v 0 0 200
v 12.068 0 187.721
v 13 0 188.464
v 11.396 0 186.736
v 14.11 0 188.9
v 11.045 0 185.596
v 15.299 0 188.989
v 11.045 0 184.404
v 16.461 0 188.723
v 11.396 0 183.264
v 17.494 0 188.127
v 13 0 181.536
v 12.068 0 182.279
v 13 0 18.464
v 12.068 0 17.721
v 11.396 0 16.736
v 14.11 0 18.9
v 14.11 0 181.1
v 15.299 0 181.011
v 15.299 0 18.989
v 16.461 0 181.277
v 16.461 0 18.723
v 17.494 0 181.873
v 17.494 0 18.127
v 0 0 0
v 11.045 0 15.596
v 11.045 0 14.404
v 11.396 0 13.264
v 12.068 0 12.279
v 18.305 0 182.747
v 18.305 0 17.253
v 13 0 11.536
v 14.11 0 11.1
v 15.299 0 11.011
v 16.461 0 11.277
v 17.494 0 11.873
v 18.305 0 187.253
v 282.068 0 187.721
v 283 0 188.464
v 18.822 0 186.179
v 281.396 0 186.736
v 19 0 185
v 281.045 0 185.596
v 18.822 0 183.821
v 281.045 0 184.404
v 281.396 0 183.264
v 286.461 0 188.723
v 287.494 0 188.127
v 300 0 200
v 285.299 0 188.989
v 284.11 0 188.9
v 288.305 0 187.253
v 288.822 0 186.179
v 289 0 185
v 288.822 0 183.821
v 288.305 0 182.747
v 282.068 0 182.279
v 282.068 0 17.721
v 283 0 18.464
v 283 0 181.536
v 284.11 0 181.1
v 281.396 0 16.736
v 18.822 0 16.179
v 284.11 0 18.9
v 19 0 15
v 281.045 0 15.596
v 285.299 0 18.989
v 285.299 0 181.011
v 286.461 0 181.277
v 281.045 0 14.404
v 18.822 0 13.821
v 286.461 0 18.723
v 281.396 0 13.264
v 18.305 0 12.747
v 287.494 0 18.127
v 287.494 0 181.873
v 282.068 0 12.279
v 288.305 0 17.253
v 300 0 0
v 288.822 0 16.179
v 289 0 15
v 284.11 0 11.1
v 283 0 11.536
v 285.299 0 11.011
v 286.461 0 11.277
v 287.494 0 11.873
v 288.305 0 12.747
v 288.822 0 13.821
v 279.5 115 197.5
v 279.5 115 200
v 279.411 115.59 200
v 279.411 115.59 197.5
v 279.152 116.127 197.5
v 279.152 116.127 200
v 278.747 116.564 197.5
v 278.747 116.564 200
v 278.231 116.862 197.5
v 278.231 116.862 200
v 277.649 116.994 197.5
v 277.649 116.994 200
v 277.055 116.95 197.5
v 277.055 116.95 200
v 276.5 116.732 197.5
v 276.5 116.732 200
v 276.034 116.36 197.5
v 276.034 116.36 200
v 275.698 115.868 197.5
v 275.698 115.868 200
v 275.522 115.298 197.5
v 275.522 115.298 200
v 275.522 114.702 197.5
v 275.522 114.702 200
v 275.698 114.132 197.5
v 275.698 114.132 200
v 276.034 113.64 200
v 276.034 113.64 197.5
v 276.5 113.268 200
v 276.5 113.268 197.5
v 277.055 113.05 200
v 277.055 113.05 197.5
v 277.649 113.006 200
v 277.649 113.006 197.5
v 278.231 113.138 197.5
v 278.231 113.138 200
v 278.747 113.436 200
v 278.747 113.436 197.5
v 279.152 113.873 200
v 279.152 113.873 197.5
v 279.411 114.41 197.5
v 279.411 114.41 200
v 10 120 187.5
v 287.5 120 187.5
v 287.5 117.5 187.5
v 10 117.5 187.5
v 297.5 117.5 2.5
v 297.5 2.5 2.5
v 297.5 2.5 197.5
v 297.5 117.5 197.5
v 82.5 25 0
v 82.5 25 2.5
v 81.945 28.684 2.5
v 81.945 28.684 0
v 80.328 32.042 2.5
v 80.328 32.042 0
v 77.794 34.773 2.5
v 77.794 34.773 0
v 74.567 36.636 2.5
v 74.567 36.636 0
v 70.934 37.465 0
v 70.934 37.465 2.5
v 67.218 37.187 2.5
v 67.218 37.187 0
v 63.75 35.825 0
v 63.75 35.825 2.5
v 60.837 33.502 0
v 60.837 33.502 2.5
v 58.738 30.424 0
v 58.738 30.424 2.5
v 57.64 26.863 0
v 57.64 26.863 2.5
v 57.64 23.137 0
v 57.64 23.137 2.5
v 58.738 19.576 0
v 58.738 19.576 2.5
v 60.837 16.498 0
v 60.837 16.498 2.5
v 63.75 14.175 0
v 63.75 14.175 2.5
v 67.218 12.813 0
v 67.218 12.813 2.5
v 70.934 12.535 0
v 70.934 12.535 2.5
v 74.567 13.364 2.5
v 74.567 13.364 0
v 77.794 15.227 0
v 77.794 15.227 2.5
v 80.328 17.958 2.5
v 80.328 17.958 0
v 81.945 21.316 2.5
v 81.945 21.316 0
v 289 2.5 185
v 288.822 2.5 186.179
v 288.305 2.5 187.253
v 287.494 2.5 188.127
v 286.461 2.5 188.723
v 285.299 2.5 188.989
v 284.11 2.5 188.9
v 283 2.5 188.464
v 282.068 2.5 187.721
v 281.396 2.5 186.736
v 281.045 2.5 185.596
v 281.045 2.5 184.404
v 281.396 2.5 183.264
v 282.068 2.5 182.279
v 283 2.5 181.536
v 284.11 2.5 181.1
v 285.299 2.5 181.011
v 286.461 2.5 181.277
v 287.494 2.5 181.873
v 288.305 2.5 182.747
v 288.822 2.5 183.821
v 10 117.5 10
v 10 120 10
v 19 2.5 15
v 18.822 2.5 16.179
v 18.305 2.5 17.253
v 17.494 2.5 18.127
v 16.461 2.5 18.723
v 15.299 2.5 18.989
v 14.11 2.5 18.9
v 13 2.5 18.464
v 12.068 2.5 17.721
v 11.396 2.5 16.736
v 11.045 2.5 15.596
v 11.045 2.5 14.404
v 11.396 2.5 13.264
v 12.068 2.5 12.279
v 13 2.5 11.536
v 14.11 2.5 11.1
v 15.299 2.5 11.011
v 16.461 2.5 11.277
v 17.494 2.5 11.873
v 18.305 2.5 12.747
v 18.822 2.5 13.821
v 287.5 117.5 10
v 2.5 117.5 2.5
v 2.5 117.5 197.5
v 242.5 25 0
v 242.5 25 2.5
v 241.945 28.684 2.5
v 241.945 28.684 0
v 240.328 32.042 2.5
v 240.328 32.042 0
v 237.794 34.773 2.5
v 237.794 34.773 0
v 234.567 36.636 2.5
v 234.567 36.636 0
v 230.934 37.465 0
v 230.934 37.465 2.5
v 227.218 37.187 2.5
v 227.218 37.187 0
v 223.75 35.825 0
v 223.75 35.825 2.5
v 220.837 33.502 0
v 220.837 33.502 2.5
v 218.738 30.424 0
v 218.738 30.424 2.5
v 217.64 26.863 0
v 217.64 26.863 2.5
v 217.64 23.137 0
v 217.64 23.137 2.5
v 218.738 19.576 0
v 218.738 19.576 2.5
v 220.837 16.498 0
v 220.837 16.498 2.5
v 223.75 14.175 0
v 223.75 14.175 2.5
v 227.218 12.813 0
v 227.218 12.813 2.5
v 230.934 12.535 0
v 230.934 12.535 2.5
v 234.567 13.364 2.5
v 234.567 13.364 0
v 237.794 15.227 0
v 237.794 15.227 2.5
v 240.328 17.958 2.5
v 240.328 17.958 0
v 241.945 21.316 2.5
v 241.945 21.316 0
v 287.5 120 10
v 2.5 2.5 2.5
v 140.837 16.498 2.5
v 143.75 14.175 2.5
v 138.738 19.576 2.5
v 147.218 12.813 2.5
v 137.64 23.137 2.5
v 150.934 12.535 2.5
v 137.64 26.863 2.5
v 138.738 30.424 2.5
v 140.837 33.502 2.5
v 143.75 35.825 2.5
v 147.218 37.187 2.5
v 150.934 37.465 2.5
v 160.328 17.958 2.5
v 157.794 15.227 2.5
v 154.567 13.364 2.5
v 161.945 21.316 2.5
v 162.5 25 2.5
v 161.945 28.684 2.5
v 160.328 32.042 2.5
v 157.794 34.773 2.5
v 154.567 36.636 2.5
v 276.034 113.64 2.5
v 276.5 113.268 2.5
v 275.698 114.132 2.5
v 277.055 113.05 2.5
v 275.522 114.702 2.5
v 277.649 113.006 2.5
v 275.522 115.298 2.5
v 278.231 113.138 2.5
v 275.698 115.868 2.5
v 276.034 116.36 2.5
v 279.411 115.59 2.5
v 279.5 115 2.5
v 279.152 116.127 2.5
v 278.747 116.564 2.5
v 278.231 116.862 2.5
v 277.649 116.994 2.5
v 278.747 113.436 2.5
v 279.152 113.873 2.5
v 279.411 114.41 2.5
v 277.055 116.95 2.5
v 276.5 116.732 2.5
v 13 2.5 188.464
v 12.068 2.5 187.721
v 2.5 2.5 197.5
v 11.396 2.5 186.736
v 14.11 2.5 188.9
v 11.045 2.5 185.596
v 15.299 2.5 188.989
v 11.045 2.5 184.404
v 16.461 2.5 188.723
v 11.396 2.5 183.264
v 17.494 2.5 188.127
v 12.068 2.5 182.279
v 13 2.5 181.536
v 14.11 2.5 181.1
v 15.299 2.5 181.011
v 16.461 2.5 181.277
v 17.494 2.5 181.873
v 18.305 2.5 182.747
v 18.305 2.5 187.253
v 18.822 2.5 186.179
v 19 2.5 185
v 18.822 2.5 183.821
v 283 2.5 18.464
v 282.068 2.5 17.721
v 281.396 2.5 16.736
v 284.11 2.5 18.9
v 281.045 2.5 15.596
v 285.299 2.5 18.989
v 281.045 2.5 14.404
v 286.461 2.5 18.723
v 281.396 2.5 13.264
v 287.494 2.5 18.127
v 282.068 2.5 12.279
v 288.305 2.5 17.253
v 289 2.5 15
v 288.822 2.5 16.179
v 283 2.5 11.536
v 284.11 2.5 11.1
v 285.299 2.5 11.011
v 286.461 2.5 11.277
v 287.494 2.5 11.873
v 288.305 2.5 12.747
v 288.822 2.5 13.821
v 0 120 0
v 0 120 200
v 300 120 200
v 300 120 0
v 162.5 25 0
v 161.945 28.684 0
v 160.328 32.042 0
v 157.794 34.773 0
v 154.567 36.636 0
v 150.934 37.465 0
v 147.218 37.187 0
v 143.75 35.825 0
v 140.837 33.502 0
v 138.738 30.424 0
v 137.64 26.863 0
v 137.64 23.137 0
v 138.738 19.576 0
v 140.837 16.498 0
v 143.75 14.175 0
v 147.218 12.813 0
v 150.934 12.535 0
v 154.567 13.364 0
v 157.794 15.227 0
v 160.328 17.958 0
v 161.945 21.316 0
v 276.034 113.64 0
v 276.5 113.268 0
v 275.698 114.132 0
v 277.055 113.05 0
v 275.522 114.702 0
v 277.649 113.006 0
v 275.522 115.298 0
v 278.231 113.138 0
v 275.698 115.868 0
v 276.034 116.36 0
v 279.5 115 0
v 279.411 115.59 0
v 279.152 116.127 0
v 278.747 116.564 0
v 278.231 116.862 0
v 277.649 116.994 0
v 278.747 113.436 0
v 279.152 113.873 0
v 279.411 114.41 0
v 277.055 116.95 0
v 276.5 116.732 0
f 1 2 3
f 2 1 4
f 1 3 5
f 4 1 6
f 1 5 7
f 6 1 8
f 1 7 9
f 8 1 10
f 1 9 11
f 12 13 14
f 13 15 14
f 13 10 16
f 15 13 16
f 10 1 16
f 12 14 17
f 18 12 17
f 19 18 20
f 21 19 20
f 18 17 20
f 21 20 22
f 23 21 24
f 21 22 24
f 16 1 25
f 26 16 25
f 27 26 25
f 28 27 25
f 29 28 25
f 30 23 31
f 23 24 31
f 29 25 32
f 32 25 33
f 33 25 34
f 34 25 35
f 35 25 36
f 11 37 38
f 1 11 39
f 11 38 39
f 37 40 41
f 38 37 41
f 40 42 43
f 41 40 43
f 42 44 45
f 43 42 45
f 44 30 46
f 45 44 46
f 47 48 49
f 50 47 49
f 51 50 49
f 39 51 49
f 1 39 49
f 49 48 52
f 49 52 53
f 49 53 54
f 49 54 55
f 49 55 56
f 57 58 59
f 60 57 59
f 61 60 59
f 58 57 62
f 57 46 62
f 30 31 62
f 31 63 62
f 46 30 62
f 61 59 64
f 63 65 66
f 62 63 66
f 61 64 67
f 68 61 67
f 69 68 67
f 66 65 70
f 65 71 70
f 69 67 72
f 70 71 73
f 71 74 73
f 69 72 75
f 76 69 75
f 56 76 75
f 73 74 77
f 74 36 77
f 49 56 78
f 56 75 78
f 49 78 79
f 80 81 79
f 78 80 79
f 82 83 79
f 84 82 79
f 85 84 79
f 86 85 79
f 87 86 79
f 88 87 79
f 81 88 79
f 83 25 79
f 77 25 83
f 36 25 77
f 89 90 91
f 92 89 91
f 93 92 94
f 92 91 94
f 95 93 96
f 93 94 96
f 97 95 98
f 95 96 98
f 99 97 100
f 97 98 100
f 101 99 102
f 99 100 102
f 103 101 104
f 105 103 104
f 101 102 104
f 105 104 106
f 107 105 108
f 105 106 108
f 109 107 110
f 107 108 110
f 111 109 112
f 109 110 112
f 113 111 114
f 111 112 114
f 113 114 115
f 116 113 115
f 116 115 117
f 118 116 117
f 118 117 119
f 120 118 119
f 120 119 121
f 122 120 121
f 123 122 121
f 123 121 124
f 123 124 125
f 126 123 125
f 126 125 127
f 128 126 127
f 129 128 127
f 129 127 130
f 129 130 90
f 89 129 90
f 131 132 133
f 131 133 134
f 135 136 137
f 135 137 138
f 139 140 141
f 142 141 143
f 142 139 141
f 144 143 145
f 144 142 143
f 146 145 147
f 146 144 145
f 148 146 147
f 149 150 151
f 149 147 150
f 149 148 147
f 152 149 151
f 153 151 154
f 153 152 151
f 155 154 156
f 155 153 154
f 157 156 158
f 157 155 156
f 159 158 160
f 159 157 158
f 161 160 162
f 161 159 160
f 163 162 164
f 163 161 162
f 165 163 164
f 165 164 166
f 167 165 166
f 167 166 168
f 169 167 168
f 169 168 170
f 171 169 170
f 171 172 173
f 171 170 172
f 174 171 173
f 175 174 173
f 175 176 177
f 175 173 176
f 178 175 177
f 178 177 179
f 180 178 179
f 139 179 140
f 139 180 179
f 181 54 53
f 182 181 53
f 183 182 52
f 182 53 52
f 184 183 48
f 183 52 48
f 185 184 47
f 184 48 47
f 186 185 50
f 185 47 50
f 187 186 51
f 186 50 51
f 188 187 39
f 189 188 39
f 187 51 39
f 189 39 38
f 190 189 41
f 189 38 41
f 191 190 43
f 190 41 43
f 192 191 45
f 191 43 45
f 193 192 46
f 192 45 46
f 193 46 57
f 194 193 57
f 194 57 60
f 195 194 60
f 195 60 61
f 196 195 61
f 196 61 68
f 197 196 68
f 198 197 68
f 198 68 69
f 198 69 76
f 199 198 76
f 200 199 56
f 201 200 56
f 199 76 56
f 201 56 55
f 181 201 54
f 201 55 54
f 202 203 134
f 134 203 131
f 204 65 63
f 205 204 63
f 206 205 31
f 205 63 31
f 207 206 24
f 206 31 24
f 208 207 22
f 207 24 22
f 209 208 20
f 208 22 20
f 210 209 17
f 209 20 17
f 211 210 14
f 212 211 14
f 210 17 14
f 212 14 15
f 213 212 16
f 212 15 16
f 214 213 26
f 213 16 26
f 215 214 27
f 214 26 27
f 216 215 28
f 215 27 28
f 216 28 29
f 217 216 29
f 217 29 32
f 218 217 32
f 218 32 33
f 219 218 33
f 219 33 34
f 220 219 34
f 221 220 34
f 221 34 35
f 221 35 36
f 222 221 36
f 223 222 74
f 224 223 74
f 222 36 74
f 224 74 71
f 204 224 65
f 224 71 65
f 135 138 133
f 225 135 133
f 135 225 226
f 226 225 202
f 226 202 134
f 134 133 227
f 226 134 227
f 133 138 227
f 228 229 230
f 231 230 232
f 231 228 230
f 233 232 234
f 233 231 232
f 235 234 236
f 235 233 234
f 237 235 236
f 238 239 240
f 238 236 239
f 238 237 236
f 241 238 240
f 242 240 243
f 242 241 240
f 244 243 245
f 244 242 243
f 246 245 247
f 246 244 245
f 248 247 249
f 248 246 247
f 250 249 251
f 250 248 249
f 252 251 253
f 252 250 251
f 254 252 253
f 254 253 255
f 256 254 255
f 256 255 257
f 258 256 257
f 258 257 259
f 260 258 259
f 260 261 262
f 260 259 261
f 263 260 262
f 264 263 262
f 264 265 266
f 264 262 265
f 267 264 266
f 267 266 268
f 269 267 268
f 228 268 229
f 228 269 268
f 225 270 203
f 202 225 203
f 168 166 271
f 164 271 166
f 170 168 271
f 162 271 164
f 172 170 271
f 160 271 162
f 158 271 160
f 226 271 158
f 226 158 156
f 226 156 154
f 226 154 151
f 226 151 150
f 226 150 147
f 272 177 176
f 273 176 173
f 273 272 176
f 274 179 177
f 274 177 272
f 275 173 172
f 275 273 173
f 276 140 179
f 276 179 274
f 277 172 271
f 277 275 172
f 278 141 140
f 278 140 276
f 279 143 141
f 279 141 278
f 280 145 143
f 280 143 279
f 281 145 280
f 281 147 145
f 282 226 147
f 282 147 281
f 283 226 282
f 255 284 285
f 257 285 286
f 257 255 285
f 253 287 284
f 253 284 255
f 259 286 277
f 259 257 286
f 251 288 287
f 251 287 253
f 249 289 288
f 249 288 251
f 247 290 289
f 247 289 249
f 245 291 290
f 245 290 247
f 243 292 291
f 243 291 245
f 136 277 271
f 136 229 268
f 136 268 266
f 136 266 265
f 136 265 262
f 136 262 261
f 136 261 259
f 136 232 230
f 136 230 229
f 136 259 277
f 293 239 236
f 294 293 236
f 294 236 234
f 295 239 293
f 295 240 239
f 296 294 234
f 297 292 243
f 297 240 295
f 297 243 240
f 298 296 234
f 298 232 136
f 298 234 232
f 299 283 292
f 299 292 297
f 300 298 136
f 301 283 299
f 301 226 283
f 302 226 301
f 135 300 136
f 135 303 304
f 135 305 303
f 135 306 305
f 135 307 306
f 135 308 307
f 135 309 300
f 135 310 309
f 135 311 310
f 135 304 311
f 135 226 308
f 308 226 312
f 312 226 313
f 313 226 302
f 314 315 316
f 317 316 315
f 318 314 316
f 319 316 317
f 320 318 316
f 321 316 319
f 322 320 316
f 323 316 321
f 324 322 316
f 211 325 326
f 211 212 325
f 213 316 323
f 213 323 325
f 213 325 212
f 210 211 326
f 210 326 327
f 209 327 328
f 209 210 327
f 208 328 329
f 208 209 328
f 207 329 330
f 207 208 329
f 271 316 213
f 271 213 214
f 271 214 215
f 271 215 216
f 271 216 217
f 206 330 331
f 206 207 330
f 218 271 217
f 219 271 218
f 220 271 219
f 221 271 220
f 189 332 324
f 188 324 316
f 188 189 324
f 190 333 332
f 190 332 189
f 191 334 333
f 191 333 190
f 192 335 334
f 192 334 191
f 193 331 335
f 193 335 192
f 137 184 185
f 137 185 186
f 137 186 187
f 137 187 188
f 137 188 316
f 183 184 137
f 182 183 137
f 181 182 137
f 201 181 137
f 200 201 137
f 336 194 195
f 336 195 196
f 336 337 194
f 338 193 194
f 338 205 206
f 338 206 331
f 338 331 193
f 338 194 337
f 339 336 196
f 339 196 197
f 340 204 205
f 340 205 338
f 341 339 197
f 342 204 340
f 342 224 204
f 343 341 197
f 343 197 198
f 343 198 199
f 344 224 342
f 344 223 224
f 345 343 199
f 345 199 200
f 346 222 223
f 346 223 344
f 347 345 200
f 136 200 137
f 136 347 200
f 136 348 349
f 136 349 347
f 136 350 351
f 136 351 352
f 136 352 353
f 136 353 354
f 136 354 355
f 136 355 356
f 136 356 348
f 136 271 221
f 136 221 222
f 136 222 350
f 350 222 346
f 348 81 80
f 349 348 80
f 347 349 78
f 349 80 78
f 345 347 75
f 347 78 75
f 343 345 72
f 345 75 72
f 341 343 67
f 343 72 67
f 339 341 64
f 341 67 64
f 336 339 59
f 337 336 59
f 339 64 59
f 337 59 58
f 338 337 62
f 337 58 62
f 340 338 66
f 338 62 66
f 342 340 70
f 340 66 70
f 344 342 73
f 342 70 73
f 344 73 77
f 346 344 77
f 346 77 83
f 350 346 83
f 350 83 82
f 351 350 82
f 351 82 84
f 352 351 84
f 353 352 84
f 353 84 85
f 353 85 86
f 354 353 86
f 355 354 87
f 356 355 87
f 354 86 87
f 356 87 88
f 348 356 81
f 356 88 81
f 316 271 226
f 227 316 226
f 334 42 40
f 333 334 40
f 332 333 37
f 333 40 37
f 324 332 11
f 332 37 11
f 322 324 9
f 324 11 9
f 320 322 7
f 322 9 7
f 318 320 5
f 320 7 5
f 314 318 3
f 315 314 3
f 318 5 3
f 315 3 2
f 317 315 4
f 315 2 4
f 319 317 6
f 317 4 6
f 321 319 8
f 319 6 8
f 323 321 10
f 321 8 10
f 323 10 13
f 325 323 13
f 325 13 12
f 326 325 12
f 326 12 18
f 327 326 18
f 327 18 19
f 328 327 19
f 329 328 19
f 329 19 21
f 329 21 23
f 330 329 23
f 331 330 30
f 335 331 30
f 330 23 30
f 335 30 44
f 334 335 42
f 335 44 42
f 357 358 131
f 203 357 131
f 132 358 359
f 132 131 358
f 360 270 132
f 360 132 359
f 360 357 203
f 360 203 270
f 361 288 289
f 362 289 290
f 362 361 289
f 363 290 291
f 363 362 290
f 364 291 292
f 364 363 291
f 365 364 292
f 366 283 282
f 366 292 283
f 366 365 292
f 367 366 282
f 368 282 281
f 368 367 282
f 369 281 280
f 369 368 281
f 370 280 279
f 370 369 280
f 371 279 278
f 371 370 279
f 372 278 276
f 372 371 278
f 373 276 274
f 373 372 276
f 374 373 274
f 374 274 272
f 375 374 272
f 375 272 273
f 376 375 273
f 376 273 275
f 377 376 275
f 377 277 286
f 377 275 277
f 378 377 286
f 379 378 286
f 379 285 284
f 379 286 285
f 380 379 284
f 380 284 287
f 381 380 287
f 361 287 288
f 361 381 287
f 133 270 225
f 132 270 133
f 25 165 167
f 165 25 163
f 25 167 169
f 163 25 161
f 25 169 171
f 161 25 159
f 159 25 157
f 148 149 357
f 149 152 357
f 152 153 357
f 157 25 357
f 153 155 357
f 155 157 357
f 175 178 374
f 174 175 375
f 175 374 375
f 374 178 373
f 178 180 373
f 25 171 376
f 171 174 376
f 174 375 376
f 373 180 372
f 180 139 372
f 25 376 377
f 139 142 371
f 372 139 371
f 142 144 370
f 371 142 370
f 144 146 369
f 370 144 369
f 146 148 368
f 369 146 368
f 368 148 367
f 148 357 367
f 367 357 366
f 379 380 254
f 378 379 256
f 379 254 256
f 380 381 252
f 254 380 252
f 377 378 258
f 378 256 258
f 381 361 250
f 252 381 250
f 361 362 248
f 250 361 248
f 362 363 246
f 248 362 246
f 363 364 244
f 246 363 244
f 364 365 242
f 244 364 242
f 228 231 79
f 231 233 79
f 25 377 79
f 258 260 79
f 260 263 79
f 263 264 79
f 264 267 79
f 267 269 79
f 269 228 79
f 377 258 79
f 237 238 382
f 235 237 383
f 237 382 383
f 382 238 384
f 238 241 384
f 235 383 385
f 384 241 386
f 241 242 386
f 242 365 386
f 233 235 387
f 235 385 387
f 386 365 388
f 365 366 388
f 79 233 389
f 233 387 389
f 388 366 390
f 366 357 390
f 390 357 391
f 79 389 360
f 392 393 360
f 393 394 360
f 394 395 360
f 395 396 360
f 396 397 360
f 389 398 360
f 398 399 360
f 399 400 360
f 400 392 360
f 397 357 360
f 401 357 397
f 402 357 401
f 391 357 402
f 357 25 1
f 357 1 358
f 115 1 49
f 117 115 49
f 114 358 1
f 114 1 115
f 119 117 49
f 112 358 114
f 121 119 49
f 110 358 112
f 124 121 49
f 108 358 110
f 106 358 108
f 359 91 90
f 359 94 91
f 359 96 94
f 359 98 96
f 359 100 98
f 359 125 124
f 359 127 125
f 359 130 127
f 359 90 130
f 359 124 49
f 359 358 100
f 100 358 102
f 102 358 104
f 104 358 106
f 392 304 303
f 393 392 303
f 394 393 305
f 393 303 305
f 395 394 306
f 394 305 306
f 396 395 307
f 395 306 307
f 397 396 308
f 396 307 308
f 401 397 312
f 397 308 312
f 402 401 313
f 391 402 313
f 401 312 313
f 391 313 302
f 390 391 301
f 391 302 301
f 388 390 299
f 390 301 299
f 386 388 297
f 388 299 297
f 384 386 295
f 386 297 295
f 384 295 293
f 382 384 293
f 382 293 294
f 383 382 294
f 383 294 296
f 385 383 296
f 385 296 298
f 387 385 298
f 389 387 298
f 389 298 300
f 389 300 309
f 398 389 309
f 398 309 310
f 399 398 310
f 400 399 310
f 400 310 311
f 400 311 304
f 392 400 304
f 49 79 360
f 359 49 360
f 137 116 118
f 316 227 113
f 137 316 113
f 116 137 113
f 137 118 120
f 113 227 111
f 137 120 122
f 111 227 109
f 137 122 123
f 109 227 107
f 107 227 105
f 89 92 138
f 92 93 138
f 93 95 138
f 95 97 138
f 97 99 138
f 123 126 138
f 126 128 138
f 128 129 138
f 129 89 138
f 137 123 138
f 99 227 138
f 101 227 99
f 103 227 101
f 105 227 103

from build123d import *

# Parameters (mm, degrees)
F0_W      = 300
F0_H      = 120
F1_DEPTH  = 200
F2_T      = -2.5
F3_W      = 297.5
F3_H      = 197.5
F3_W_2    = 277.5
F3_H_2    = 177.5
F4_DEPTH  = 2.5
F5_R      = 2
F6_DEPTH  = 200.001
F7_R      = 4
F8_DEPTH  = 2.5
F9_R      = 12.5
F10_DEPTH = 25


with BuildPart() as f1:
    # F0 (on Top) → F1 (new body)
    with BuildSketch(Plane.XY):
        with Locations((150, 60)):
            Rectangle(F0_W, F0_H)
    extrude(amount=F1_DEPTH)

    # F2
    f2_openings = [f1.faces().sort_by_distance(p)[0] for p in [
        (150, 120, 100),
    ]]
    offset(amount=F2_T, openings=f2_openings)

    # F3 (on face) → F4 (join)
    with BuildSketch(Plane(origin=(0, 120, 0), x_dir=(-1, 0, 0), z_dir=(0, 1, 0))):
        with Locations((-148.75, 98.75)):
            Rectangle(F3_W, F3_H)
        with Locations((-148.75, 98.75)):
            Rectangle(F3_W_2, F3_H_2, mode=Mode.SUBTRACT)
    extrude(amount=-F4_DEPTH)

    # F5 (on face) → F6 (cut, through all)
    with BuildSketch(Plane.XY.offset(200)):
        with Locations((277.5, 115)):
            Circle(F5_R)
    extrude(amount=-F6_DEPTH, mode=Mode.SUBTRACT)

    # F7 (on face) → F8 (cut)
    with BuildSketch(Plane.XZ):
        with Locations((285, 185)):
            Circle(F7_R)
        with Locations((285, 15)):
            Circle(F7_R)
        with Locations((15, 185)):
            Circle(F7_R)
        with Locations((15, 15)):
            Circle(F7_R)
    extrude(amount=-F8_DEPTH, mode=Mode.SUBTRACT)

    # F9 (on face) → F10 (cut)
    with BuildSketch(Plane.XY):
        with Locations((70, 25)):
            Circle(F9_R)
        with Locations((150, 25)):
            Circle(F9_R)
        with Locations((230, 25)):
            Circle(F9_R)
    extrude(amount=F10_DEPTH, mode=Mode.SUBTRACT)


solid = f1.part
